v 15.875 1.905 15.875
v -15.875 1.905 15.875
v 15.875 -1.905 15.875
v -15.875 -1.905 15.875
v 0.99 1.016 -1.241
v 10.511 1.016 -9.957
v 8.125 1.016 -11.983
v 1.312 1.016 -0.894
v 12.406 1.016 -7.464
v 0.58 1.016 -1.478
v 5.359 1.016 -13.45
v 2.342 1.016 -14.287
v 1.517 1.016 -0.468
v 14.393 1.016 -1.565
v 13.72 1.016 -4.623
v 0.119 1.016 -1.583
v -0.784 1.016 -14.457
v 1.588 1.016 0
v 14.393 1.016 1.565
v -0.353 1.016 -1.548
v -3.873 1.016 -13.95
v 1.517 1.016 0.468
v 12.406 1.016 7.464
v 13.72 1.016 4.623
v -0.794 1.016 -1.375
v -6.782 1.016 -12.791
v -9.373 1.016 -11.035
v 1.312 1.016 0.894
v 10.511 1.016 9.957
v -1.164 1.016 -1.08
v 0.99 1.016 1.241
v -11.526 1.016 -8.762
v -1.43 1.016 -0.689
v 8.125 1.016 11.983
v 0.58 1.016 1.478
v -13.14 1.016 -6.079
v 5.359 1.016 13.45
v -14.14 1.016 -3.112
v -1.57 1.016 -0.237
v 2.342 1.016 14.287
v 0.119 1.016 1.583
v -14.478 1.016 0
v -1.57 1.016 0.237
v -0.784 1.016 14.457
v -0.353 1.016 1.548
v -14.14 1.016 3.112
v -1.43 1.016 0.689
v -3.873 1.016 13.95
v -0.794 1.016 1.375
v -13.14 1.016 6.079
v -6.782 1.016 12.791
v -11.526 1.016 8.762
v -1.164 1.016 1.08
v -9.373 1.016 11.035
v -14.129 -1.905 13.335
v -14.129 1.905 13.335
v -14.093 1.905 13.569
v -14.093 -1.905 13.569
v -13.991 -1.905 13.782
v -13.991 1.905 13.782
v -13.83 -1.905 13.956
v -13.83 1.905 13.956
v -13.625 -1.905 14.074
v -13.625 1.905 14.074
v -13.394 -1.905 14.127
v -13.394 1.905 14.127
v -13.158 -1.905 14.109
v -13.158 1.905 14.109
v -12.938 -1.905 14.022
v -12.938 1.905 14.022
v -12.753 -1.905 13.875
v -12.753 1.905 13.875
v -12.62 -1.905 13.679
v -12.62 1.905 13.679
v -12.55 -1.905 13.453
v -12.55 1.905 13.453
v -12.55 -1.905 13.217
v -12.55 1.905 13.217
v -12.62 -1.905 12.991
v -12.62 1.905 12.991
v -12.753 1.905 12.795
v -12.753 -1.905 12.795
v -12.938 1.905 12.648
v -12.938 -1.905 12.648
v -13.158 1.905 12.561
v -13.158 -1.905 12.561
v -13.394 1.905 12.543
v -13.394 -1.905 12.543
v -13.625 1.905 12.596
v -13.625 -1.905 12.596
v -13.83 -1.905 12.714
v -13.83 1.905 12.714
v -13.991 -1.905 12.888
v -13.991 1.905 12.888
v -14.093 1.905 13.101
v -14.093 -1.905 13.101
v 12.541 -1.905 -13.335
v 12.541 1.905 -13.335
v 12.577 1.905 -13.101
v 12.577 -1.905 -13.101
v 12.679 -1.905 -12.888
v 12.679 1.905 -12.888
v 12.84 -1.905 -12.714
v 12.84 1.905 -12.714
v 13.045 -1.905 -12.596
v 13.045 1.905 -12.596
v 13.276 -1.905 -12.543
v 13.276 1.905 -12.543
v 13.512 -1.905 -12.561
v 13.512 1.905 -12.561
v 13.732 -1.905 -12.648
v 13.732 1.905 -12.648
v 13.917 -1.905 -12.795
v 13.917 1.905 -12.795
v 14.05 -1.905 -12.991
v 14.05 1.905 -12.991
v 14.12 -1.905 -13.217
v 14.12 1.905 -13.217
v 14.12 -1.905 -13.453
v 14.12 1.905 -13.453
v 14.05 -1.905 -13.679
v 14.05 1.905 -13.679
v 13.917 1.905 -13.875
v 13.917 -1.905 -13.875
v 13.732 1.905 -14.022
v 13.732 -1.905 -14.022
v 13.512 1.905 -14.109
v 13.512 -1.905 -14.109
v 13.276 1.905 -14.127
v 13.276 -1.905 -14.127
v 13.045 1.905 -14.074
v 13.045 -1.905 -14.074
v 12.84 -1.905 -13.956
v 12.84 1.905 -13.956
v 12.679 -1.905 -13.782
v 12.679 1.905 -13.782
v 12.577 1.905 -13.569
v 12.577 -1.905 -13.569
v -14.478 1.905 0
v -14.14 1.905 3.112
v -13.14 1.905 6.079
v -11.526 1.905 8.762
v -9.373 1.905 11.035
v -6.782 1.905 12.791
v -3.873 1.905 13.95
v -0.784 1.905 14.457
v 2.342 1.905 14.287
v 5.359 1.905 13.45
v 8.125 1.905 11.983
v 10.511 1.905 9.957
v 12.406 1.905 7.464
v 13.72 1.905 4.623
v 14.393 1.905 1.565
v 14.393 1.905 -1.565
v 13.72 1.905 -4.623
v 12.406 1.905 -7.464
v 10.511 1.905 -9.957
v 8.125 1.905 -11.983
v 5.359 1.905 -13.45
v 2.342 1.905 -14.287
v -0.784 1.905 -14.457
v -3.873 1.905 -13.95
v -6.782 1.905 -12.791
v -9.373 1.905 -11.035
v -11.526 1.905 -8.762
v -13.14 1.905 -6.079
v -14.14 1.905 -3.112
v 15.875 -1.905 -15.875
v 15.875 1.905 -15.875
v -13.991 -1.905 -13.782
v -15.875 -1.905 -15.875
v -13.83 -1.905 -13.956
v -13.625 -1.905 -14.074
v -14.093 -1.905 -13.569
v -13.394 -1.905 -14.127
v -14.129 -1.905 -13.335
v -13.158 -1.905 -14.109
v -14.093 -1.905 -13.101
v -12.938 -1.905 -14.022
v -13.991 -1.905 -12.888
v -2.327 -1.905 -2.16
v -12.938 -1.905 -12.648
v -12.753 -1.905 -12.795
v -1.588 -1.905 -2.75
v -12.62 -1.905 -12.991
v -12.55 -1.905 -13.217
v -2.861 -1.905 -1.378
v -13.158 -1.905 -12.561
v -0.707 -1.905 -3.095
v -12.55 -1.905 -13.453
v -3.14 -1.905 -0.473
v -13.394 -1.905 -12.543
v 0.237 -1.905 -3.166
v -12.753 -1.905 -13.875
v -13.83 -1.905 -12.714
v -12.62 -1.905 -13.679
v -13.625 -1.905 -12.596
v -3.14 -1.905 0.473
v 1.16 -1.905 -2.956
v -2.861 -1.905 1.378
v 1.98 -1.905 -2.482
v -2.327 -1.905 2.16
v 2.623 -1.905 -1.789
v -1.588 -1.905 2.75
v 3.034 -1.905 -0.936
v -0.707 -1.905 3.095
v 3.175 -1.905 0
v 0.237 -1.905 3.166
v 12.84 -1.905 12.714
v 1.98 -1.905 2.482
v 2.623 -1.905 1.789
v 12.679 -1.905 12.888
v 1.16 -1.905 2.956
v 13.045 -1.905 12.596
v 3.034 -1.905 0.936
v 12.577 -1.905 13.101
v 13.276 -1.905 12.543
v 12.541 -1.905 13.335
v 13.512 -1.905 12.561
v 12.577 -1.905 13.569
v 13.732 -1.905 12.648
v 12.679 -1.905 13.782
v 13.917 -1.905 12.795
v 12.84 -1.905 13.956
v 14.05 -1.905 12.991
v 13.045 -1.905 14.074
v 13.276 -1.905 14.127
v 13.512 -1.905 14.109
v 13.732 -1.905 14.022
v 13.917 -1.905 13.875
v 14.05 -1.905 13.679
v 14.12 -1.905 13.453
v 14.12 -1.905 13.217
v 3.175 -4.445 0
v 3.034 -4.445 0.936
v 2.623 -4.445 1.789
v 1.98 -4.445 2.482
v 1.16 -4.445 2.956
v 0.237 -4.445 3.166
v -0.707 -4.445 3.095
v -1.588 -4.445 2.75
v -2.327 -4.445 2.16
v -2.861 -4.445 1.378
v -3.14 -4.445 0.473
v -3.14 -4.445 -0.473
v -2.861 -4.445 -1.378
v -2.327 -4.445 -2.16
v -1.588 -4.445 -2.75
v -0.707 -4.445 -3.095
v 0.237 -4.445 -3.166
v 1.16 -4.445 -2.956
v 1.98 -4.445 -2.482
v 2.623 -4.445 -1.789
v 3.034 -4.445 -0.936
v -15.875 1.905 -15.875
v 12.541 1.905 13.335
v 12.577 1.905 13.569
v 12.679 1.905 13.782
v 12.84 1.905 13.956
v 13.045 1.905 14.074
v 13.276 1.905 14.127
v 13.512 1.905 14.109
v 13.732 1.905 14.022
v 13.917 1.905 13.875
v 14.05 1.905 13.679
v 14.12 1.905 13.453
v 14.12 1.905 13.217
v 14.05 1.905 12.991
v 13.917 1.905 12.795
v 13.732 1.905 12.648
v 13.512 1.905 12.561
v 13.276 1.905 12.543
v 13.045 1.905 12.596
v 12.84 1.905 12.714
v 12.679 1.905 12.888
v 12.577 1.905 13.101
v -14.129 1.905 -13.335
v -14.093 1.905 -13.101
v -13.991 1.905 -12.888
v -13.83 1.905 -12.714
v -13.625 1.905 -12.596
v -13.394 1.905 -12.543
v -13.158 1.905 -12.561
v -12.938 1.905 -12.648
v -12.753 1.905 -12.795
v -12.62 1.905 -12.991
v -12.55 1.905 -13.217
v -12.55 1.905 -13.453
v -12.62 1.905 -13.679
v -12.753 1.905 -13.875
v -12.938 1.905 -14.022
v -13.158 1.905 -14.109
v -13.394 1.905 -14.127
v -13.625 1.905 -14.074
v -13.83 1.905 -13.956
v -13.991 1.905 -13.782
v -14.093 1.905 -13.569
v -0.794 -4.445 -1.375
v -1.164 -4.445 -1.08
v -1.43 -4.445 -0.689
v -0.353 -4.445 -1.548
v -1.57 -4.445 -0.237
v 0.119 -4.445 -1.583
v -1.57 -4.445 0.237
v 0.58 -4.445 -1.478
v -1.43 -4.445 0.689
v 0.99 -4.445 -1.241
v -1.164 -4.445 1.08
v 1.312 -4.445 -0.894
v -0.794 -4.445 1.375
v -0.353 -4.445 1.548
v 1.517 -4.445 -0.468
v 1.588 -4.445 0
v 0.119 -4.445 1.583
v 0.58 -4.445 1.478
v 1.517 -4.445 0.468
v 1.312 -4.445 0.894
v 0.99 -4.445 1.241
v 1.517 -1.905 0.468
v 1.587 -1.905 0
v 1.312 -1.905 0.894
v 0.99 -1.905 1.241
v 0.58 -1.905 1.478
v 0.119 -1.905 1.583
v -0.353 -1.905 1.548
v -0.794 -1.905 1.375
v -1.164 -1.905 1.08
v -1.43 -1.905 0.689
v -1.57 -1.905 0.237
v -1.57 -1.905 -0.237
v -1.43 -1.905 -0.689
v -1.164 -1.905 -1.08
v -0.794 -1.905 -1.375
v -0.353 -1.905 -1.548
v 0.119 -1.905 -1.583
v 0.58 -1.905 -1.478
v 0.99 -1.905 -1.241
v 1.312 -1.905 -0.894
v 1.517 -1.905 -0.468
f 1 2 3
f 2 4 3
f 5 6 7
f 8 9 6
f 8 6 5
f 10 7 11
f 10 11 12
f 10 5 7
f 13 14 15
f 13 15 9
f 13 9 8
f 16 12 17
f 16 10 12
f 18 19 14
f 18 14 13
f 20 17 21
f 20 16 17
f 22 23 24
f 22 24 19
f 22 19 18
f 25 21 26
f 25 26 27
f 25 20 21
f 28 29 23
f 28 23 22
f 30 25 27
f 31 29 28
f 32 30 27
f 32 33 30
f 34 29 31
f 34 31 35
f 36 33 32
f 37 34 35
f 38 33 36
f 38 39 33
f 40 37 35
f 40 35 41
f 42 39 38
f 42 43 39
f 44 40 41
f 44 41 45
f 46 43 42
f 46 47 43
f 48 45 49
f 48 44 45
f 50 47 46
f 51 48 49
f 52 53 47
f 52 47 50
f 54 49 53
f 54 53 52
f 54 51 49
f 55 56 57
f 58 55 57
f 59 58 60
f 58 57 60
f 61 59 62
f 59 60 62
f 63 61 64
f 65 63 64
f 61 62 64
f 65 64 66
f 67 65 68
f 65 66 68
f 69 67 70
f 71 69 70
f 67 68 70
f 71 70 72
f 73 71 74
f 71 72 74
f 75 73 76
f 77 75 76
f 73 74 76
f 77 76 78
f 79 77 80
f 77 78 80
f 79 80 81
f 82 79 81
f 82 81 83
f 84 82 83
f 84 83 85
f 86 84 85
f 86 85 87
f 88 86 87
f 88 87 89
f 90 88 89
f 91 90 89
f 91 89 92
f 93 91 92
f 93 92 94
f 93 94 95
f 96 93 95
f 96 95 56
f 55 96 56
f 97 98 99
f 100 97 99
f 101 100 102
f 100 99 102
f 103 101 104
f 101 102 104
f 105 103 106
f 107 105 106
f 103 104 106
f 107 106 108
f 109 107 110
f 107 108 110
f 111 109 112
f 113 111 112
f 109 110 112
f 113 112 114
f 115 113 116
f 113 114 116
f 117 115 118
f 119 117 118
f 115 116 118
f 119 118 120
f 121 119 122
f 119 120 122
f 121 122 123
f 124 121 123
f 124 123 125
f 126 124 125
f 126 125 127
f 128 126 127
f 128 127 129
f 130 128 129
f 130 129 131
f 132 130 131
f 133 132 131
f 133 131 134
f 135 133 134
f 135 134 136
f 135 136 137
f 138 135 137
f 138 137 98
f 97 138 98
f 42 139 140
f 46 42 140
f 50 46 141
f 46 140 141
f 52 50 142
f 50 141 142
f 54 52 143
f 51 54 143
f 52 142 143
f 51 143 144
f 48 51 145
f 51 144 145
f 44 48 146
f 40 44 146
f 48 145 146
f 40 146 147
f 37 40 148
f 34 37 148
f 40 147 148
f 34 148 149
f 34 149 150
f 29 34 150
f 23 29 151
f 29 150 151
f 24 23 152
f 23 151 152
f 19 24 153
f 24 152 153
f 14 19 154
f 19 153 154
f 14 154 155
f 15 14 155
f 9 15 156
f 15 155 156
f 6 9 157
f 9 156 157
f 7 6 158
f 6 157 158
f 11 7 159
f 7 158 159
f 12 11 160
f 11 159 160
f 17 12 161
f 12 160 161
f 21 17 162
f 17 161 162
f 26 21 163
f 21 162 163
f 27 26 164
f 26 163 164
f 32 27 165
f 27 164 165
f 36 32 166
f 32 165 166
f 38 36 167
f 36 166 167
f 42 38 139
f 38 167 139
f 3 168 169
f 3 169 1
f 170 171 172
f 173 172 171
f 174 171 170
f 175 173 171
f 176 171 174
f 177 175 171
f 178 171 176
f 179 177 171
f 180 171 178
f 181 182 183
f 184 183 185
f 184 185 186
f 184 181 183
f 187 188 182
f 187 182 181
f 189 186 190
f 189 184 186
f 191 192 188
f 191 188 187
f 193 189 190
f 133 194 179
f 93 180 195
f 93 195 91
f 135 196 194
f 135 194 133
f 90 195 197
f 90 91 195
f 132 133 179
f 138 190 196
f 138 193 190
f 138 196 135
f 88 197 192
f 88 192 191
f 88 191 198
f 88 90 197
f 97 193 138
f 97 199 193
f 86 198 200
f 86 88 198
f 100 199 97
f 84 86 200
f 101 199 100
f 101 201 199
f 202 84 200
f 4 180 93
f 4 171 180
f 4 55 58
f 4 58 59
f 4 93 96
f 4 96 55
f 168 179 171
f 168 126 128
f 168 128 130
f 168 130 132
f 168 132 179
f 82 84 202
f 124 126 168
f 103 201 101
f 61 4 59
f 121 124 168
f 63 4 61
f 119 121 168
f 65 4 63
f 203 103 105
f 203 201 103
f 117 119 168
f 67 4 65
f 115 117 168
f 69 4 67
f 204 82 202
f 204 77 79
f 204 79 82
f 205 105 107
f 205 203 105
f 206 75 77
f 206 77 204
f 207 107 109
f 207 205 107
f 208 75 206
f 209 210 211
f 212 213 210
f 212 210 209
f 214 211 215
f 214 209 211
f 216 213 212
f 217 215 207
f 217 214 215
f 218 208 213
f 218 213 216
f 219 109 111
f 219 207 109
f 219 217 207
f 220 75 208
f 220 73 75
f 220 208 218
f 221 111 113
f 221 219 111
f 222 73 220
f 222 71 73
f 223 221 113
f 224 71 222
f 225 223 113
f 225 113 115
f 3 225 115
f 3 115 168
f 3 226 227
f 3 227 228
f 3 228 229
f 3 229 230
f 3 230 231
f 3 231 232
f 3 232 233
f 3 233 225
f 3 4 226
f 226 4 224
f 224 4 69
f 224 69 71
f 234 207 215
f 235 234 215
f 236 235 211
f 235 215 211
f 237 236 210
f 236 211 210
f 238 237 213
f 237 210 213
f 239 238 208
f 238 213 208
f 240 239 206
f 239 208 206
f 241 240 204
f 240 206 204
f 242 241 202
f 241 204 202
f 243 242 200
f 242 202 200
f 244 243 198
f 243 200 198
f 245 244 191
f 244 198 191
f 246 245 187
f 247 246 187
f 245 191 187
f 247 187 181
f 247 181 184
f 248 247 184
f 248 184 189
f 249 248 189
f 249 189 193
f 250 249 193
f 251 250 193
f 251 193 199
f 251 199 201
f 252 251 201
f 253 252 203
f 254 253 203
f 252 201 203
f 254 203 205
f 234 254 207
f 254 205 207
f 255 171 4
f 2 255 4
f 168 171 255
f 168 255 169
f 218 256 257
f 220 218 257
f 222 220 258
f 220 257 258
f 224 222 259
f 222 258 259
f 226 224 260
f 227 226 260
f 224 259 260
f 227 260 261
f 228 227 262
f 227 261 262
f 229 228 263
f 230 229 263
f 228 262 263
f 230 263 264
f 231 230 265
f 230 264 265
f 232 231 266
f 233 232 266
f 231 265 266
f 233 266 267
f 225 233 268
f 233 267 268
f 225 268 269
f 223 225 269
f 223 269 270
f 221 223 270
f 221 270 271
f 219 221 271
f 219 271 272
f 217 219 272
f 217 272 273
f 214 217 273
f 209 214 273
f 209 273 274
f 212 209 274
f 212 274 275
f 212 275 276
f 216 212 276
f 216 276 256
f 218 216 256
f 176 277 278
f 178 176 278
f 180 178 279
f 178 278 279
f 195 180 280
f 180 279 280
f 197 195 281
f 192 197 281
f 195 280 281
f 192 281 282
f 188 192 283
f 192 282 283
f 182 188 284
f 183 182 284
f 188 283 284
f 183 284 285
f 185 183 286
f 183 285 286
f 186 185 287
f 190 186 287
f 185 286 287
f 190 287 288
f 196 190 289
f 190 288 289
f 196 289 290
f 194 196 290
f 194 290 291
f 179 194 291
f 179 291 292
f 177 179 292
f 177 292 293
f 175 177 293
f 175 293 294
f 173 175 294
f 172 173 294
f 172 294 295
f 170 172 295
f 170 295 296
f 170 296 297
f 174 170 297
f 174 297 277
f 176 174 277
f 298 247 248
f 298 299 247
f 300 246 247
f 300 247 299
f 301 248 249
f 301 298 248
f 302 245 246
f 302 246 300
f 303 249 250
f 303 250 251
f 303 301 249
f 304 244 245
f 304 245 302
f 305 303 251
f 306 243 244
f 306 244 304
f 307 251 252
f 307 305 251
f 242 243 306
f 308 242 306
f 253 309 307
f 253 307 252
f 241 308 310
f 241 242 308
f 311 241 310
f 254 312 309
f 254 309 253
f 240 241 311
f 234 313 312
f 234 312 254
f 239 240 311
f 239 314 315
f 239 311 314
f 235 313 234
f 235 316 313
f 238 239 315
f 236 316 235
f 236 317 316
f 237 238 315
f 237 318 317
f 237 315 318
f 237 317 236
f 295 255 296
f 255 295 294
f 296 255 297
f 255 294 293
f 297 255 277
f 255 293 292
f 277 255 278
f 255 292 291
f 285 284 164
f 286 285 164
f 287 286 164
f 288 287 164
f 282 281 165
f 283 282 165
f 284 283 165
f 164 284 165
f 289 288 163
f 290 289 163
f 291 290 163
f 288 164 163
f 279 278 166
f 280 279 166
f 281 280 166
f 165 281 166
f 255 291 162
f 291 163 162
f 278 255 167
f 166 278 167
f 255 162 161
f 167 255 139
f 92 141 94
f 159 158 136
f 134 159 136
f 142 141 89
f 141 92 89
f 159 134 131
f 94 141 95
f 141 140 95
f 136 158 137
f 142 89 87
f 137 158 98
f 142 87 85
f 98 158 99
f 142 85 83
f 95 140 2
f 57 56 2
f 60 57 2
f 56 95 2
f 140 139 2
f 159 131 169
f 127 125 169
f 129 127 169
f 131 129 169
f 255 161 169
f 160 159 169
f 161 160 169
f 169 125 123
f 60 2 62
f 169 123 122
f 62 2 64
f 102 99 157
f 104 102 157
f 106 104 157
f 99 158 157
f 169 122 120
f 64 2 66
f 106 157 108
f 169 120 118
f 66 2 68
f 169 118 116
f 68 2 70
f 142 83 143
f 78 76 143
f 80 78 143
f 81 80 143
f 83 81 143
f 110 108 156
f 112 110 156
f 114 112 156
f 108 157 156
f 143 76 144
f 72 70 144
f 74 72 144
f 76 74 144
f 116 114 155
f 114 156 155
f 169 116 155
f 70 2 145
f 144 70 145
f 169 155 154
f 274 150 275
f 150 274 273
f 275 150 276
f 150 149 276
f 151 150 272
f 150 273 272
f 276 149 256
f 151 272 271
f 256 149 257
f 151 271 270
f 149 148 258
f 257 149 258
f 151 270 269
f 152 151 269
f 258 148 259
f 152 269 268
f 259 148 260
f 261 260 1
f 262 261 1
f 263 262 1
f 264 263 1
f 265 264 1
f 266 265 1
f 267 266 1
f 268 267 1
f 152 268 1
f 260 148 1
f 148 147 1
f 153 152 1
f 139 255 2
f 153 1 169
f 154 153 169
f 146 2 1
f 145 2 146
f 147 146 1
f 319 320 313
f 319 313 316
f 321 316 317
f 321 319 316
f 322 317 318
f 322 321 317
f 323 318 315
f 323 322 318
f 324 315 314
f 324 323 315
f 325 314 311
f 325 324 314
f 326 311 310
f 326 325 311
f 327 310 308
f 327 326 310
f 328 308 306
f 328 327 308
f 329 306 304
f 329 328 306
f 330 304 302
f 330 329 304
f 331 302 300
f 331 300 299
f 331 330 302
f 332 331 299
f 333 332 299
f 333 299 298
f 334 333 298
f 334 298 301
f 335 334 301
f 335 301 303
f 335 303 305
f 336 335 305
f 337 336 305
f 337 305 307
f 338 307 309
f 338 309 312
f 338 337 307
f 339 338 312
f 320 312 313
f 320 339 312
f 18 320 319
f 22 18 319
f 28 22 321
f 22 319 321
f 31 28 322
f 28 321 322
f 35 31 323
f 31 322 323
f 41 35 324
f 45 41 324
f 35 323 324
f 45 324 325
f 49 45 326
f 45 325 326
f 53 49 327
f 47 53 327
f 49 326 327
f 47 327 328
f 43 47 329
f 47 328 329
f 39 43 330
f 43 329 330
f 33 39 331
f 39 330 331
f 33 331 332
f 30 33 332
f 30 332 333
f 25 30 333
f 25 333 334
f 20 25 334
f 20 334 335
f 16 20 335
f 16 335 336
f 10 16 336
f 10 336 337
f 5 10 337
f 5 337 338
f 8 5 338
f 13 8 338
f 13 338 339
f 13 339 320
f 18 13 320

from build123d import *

# Parameters (mm, degrees)
F0_W     = 31.75
F0_H     = 31.75
F1_DEPTH = 1.905
F2_R     = 14.478
F3_DEPTH = 0.889
F5_D     = 1.5875
F6_R     = 1.5875
F7_DEPTH = 3.811
F8_R     = 3.175
F8_R_2   = 1.5875
F9_DEPTH = 2.54


with BuildPart() as f1:
    # F0 (on Front) → F1 (new body, symmetric)
    with BuildSketch(Plane.XZ):
        Rectangle(F0_W, F0_H)
    extrude(amount=F1_DEPTH, both=True)

    # F2 (on face) → F3 (cut)
    with BuildSketch(Plane(origin=(0, 1.905, 0), x_dir=(-1, 0, 0), z_dir=(0, 1, 0))):
        Circle(F2_R)
    extrude(amount=-F3_DEPTH, mode=Mode.SUBTRACT)

    # F5 (through all)
    with Locations(Plane.XZ.offset(1.905)):
        with Locations((-13.335, 13.335), (13.335, 13.335), (13.335, -13.335), (-13.335, -13.335)):
            Hole(F5_D / 2)

    # F6 (on face) → F7 (cut, through all)
    with BuildSketch(Plane.XZ.offset(1.905)):
        Circle(F6_R)
    extrude(amount=-F7_DEPTH, mode=Mode.SUBTRACT)

    # F8 (on face) → F9 (join)
    with BuildSketch(Plane.XZ.offset(1.905)):
        Circle(F8_R)
        Circle(F8_R_2, mode=Mode.SUBTRACT)
    extrude(amount=F9_DEPTH)


solid = f1.part
